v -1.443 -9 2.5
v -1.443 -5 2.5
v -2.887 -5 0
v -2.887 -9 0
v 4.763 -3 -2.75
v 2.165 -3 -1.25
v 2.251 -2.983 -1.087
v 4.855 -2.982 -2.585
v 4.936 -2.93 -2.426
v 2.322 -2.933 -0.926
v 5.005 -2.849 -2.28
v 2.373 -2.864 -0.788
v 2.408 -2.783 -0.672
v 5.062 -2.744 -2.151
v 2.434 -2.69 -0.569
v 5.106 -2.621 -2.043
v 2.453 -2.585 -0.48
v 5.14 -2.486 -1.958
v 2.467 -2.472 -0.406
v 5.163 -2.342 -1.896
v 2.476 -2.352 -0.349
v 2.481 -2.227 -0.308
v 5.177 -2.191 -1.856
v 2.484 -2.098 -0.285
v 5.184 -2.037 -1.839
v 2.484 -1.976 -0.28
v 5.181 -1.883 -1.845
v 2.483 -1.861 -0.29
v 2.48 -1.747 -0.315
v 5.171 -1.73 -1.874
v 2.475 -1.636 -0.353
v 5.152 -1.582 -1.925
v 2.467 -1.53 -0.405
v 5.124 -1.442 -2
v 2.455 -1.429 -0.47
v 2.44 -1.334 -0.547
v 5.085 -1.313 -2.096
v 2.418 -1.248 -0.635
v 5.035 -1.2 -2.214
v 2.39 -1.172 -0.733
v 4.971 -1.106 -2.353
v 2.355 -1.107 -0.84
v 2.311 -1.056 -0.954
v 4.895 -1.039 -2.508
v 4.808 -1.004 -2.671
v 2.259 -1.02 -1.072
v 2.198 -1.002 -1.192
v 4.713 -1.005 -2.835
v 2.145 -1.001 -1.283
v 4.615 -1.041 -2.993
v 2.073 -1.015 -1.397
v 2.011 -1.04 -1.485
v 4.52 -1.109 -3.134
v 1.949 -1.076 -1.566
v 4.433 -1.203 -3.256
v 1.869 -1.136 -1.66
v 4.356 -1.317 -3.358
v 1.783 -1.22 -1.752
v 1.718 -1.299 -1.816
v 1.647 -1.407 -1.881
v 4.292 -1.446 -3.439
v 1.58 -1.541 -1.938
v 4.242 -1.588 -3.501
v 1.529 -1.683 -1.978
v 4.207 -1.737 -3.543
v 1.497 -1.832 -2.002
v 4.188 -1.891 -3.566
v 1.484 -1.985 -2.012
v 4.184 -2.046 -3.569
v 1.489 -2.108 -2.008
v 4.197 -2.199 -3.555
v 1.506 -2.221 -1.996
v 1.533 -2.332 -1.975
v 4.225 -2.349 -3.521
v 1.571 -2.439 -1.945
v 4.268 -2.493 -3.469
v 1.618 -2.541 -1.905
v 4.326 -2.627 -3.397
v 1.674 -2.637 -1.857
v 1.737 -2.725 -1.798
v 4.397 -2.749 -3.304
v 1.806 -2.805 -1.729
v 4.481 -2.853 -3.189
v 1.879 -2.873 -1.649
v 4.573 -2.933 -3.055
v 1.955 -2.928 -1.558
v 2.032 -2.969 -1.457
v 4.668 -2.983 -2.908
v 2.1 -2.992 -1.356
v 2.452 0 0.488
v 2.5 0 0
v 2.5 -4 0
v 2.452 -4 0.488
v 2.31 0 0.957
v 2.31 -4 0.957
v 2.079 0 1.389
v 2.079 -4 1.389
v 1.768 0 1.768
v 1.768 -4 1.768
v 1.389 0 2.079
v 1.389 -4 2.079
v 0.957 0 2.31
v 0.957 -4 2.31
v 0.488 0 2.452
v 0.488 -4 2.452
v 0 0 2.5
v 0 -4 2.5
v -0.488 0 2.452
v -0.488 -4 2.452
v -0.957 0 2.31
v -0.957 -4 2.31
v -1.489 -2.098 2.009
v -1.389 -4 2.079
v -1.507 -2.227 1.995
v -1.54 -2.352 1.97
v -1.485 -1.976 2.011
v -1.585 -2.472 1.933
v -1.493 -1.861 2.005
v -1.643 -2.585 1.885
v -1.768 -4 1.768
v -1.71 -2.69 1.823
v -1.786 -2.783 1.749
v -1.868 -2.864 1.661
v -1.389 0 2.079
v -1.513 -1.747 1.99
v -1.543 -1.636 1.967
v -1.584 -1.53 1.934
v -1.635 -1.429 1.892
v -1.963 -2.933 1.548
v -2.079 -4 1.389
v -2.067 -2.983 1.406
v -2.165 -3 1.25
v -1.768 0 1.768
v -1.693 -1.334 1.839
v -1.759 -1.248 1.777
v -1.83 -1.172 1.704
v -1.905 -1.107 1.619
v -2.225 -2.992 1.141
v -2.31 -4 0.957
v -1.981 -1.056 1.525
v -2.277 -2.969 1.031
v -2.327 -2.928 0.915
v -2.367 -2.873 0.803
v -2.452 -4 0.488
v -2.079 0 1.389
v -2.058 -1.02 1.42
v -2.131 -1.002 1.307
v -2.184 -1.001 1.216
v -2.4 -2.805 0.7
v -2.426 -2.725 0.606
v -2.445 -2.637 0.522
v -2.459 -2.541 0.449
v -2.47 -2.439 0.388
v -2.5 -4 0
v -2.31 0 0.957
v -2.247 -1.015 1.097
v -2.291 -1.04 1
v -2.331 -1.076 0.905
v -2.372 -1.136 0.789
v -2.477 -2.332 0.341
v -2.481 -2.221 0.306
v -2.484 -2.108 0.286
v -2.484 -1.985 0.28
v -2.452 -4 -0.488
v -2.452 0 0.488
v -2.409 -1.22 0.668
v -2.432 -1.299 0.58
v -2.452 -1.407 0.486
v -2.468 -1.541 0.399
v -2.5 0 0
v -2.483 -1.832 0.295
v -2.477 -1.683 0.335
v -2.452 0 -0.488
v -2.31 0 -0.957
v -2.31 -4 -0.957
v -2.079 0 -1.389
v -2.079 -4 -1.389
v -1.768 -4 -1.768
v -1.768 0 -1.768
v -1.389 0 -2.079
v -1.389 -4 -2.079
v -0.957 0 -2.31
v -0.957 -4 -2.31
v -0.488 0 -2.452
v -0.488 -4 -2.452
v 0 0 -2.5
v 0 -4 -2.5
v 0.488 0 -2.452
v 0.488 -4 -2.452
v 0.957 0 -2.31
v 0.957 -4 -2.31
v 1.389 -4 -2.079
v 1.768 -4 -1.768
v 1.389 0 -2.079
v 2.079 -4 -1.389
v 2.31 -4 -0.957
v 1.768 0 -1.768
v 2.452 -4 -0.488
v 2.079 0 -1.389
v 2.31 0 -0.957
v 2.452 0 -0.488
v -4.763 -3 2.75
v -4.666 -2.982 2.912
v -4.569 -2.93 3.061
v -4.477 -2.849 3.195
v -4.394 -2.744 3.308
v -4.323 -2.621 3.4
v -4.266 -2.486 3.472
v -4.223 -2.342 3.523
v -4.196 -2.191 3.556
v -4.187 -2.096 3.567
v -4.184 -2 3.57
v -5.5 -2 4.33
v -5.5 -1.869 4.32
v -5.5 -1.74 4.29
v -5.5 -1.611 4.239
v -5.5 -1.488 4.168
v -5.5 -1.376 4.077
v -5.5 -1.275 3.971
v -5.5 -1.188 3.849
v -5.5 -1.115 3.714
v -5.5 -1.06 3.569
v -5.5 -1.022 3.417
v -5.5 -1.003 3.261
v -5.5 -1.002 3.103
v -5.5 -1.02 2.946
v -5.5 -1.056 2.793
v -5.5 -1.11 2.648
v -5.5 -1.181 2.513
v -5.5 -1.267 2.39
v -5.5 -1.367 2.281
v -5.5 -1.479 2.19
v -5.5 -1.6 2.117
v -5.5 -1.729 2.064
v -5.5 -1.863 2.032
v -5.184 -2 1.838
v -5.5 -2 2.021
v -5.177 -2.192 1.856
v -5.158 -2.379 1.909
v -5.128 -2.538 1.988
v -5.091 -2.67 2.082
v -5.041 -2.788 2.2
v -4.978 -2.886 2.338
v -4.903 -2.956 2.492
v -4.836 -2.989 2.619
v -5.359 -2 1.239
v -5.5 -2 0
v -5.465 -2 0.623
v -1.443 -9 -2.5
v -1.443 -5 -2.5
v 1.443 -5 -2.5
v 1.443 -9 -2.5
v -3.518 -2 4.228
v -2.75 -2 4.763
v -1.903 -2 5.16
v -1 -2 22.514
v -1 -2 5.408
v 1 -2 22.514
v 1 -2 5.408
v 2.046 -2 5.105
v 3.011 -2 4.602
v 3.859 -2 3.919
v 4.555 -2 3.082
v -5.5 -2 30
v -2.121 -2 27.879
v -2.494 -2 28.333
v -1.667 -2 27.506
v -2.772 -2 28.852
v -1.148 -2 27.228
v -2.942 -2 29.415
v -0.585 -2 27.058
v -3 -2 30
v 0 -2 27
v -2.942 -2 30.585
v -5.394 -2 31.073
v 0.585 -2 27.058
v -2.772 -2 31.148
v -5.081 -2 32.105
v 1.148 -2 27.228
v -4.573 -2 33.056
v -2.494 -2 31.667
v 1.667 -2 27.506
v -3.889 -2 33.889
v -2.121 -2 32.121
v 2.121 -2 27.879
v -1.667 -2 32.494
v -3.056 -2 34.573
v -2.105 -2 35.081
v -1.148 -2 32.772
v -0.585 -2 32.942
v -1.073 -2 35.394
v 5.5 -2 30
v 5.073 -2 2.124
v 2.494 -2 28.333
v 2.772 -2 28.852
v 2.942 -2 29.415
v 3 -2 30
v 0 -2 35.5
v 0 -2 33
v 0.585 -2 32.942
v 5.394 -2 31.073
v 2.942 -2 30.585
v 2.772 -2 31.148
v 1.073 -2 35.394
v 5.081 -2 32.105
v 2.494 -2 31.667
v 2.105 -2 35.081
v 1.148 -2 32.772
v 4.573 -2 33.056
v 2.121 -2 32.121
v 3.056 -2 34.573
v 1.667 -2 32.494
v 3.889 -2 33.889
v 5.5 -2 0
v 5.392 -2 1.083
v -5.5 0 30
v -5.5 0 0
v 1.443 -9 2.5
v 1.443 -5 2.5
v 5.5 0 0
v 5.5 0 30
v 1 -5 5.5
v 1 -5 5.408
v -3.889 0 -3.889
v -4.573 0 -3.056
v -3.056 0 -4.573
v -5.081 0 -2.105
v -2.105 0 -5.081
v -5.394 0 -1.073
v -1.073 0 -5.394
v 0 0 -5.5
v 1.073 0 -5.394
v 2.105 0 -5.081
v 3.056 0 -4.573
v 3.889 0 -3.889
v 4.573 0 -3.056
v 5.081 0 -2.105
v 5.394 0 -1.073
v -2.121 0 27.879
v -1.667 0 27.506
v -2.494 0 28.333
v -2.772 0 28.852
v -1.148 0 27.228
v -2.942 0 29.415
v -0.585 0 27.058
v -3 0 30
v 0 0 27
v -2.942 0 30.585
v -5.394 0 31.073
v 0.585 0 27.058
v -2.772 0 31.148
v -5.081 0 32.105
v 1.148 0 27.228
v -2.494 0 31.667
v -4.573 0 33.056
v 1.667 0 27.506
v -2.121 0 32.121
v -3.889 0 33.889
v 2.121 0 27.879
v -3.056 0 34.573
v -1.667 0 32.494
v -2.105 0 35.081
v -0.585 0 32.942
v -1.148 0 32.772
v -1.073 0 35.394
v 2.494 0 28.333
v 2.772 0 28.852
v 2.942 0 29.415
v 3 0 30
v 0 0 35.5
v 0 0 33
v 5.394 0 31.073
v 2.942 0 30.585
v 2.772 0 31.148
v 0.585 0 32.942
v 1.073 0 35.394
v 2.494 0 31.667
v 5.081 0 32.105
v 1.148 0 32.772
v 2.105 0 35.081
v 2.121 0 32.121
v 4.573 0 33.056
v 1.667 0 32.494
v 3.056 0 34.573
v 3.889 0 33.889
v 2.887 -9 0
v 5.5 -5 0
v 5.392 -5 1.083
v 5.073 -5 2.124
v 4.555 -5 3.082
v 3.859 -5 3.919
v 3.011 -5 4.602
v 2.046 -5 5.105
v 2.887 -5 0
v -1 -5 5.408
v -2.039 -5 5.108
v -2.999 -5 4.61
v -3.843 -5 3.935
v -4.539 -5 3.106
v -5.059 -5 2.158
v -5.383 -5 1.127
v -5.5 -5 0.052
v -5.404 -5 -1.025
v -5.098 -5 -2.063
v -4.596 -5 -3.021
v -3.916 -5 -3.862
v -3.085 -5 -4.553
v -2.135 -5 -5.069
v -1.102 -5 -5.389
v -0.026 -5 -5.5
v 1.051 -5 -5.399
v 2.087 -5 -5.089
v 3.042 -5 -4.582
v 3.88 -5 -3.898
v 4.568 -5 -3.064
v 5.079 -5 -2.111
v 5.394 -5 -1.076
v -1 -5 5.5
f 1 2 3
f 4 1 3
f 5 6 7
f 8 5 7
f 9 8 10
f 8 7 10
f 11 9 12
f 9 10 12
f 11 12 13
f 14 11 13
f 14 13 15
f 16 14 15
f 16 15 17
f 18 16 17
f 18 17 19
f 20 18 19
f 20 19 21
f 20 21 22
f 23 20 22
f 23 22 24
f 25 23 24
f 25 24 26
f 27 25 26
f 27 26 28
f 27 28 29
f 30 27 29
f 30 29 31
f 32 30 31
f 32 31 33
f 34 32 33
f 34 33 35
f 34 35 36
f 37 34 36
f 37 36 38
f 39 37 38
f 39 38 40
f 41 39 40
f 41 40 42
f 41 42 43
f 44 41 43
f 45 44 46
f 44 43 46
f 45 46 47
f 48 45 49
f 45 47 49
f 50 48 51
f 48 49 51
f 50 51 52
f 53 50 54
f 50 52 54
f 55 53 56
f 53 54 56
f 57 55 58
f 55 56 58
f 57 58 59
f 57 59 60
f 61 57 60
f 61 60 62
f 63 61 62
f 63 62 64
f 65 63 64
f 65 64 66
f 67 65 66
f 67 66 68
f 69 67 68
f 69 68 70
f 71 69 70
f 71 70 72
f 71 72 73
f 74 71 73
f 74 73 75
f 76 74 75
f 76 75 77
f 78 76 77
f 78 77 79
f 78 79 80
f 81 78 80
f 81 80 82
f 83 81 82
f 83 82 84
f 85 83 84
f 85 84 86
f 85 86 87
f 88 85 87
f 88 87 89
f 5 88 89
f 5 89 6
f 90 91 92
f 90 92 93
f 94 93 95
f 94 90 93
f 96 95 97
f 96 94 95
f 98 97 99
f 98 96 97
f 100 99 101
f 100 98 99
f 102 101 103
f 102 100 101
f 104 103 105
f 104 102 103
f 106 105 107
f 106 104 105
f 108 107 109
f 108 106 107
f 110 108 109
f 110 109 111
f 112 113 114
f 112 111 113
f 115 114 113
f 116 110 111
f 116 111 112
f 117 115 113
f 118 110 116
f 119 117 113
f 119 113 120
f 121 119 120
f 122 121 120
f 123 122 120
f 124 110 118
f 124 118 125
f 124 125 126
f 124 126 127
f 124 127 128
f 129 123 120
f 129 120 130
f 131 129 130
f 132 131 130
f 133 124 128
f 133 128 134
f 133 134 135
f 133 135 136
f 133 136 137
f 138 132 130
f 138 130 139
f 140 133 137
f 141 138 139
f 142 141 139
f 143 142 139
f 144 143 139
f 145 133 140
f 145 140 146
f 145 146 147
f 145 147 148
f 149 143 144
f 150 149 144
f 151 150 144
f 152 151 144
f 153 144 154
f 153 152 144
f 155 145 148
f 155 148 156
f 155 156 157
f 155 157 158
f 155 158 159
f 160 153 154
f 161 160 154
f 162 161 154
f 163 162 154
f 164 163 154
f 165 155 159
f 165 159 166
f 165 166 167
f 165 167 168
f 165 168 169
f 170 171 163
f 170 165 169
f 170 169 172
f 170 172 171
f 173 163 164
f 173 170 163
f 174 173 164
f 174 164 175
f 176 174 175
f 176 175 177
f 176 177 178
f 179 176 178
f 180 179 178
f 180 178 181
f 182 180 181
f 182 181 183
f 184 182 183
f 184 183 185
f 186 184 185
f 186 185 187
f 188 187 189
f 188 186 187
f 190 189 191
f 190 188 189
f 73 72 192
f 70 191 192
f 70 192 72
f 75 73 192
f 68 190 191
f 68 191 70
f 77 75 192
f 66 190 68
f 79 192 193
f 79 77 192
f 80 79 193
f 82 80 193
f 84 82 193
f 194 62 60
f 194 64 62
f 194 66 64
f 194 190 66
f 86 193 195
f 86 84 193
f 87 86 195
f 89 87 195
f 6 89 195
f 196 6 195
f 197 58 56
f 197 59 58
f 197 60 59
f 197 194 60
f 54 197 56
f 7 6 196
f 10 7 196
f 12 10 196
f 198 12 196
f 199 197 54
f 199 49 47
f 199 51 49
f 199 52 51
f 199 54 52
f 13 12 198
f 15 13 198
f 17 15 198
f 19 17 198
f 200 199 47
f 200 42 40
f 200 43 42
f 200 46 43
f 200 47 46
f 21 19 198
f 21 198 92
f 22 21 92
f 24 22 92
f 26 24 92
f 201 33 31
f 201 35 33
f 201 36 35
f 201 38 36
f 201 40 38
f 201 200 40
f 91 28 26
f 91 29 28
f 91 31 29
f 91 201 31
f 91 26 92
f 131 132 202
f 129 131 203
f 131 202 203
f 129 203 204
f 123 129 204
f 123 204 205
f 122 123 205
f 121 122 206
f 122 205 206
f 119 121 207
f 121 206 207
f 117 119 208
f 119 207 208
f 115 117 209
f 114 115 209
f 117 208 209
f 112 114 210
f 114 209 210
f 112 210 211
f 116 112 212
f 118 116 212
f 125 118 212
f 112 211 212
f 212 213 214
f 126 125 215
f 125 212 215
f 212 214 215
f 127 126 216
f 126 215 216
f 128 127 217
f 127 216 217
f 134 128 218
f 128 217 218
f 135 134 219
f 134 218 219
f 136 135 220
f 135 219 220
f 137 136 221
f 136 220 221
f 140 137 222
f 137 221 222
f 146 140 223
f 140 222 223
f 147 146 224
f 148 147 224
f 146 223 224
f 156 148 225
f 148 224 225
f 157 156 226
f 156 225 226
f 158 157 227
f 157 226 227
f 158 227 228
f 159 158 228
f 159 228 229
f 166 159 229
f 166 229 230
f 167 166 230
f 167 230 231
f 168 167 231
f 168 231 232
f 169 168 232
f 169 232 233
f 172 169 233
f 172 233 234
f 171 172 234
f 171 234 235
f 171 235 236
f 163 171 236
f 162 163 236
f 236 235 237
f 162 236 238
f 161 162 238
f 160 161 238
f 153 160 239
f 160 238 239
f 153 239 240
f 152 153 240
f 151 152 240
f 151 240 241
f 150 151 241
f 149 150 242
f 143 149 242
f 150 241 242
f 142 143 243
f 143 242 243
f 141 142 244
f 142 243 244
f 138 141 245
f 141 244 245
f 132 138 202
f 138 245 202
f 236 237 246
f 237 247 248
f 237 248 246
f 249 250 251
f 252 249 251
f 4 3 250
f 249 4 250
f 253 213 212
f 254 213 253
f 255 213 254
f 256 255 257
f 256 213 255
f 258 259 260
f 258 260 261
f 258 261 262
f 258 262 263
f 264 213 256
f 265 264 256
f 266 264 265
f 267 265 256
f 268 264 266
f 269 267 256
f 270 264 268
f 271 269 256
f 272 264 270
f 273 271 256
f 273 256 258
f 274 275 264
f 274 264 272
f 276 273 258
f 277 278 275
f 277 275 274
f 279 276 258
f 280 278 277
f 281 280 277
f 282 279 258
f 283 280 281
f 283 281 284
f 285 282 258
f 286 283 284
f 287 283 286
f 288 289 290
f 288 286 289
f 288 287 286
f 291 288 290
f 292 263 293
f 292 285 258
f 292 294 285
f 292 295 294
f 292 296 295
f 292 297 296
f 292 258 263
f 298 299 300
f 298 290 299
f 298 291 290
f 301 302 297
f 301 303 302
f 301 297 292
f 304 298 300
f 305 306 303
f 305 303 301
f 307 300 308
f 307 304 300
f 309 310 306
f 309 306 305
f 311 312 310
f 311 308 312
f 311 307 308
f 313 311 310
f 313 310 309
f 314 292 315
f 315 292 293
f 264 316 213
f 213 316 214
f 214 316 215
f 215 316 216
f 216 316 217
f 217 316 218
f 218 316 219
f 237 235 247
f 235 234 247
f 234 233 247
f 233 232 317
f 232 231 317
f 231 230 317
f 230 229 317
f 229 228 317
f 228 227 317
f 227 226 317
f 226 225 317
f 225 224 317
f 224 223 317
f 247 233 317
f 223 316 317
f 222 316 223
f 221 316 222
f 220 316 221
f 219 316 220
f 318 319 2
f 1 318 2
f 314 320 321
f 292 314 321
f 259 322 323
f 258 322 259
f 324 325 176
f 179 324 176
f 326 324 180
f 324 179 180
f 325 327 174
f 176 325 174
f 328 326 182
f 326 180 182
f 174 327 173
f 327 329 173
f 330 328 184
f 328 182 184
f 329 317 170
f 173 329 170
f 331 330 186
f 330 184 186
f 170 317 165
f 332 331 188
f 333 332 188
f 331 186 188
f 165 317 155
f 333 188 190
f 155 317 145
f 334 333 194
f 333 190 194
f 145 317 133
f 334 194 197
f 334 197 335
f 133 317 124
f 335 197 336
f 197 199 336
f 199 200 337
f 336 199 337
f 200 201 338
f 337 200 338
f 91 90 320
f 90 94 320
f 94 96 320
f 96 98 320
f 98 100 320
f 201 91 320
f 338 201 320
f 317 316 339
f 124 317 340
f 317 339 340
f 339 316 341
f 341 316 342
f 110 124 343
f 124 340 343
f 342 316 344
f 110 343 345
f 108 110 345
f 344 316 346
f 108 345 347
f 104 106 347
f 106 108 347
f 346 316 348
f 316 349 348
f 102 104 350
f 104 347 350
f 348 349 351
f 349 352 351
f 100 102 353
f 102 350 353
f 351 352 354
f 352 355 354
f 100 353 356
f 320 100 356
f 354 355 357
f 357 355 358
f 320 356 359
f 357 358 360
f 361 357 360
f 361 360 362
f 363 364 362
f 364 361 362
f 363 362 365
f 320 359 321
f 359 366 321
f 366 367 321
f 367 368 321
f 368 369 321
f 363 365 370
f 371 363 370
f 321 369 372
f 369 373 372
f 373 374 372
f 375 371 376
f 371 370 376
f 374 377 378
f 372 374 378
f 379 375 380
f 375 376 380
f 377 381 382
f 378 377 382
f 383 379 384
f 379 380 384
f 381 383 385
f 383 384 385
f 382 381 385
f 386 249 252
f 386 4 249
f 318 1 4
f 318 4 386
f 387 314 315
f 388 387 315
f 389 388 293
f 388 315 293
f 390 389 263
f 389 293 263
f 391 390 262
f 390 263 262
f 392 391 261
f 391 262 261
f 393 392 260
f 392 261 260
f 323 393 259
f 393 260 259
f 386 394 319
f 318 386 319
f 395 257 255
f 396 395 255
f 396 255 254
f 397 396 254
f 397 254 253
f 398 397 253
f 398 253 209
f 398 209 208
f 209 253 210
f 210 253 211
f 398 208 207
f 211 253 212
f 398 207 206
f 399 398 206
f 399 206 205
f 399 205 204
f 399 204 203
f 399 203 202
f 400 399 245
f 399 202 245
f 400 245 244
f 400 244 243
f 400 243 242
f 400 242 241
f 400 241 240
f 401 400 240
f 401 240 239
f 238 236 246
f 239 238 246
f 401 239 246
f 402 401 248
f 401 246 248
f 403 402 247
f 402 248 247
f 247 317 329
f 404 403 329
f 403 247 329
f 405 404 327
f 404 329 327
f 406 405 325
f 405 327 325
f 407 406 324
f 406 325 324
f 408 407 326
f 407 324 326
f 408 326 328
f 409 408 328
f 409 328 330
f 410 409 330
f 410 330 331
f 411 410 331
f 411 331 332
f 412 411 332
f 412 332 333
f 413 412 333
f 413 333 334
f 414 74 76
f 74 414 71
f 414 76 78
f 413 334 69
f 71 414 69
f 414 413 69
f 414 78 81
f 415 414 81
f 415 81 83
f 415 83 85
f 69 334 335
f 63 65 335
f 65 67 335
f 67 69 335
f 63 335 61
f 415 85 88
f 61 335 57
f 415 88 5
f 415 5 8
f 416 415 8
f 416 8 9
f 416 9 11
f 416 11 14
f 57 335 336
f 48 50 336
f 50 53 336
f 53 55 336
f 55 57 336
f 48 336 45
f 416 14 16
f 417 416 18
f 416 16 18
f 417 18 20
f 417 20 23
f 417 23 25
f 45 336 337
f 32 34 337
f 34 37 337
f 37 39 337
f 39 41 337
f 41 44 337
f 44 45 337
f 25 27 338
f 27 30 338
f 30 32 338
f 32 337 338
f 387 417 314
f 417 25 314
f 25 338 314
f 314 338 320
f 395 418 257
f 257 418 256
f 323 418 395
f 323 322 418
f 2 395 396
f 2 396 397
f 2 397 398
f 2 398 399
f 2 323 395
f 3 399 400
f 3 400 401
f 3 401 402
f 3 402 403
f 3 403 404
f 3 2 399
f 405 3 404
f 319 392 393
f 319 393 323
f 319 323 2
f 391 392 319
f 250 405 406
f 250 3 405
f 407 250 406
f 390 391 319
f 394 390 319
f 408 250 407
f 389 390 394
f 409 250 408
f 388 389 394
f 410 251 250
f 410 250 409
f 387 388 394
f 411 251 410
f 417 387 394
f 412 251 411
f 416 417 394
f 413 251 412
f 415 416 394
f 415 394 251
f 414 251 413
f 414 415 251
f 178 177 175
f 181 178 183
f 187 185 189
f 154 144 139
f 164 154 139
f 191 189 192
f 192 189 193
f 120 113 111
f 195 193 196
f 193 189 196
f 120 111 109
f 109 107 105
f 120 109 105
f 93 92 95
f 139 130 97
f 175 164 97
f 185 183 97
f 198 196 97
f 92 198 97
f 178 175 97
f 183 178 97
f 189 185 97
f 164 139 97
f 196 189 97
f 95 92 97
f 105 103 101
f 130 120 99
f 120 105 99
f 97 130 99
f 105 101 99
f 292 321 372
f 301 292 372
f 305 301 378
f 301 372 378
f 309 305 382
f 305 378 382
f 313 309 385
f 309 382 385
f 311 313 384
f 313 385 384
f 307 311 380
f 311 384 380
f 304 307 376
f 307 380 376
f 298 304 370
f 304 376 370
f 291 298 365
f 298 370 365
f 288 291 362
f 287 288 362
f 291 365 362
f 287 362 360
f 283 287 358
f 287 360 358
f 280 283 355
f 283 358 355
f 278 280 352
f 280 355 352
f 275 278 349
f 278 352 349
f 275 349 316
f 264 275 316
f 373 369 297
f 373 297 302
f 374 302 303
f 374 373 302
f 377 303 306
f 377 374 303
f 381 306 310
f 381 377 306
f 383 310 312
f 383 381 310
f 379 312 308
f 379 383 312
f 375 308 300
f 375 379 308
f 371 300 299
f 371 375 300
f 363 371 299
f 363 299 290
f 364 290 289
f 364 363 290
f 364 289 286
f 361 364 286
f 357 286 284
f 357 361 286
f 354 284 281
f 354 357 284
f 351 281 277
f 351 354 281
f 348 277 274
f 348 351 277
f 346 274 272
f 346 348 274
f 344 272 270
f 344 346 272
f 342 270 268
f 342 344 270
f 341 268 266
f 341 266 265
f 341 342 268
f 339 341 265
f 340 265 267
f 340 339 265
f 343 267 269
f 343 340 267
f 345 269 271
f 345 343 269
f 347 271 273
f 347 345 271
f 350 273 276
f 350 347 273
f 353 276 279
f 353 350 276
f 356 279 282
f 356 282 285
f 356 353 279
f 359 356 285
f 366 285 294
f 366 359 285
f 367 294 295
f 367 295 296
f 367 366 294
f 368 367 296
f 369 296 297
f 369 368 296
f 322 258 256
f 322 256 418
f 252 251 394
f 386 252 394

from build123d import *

# Parameters (mm, degrees)
F0_R     = 3
F1_DEPTH = 2
F2_DEPTH = 5
F3_DEPTH = 9
F4_R     = 2.5
F5_DEPTH = 4
F7_DEPTH = 1
F10_D    = 2


with BuildPart() as f1:
    # F0 (on Front) → F1 (new body)
    with BuildSketch(Plane.XZ):
        with BuildLine():
            ThreePointArc((-5.5, 0), (0, 5.5), (5.5, 0))
            Line((5.5, 0), (5.5, 30))
            ThreePointArc((5.5, 30), (0, 35.5), (-5.5, 30))
            Line((-5.5, 30), (-5.5, 0))
        make_face()
        with Locations((0, 30)):
            Circle(F0_R, mode=Mode.SUBTRACT)
    extrude(amount=F1_DEPTH)

    # F0 (on Front) → F2 (join)
    with BuildSketch(Plane.XZ):
        with BuildLine():
            ThreePointArc((-5.5, 0), (0, -5.5), (5.5, 0))
            ThreePointArc((5.5, 0), (0, 5.5), (-5.5, 0))
        make_face()
        Polygon((2.8867513459, 0), (1.443375673, -2.5), (-1.443375673, -2.5), (-2.8867513459, 0), (-1.443375673, 2.5), (1.443375673, 2.5), align=None, mode=Mode.SUBTRACT)
    extrude(amount=F2_DEPTH)

    # F0 (on Front) → F3 (join)
    with BuildSketch(Plane.XZ):
        Polygon((-1.443375673, -2.5), (1.443375673, -2.5), (2.8867513459, 0), (1.443375673, 2.5), (-1.443375673, 2.5), (-2.8867513459, 0), align=None)
    extrude(amount=F3_DEPTH)

    # F4 (on face) → F5 (cut)
    with BuildSketch(Plane.XZ):
        Circle(F4_R)
    extrude(amount=F5_DEPTH, mode=Mode.SUBTRACT)

    # F6 (on Right) → F7 (join, symmetric)
    with BuildSketch(Plane.YZ):
        Polygon((-5, 5.5), (-5, 3.9388309233), (0, 3.9388309233), (0, 23.931786418), (-1.7340160995, 24.0223151183), align=None)
    extrude(amount=F7_DEPTH, both=True)

    # F10 (through all)
    with Locations(Plane(origin=(4.7631397208, 0, -2.75), x_dir=(0, 1, 0), z_dir=(0.8660254038, 0, -0.5))):
        with Locations((-2, 0)):
            Hole(F10_D / 2)


solid = f1.part
